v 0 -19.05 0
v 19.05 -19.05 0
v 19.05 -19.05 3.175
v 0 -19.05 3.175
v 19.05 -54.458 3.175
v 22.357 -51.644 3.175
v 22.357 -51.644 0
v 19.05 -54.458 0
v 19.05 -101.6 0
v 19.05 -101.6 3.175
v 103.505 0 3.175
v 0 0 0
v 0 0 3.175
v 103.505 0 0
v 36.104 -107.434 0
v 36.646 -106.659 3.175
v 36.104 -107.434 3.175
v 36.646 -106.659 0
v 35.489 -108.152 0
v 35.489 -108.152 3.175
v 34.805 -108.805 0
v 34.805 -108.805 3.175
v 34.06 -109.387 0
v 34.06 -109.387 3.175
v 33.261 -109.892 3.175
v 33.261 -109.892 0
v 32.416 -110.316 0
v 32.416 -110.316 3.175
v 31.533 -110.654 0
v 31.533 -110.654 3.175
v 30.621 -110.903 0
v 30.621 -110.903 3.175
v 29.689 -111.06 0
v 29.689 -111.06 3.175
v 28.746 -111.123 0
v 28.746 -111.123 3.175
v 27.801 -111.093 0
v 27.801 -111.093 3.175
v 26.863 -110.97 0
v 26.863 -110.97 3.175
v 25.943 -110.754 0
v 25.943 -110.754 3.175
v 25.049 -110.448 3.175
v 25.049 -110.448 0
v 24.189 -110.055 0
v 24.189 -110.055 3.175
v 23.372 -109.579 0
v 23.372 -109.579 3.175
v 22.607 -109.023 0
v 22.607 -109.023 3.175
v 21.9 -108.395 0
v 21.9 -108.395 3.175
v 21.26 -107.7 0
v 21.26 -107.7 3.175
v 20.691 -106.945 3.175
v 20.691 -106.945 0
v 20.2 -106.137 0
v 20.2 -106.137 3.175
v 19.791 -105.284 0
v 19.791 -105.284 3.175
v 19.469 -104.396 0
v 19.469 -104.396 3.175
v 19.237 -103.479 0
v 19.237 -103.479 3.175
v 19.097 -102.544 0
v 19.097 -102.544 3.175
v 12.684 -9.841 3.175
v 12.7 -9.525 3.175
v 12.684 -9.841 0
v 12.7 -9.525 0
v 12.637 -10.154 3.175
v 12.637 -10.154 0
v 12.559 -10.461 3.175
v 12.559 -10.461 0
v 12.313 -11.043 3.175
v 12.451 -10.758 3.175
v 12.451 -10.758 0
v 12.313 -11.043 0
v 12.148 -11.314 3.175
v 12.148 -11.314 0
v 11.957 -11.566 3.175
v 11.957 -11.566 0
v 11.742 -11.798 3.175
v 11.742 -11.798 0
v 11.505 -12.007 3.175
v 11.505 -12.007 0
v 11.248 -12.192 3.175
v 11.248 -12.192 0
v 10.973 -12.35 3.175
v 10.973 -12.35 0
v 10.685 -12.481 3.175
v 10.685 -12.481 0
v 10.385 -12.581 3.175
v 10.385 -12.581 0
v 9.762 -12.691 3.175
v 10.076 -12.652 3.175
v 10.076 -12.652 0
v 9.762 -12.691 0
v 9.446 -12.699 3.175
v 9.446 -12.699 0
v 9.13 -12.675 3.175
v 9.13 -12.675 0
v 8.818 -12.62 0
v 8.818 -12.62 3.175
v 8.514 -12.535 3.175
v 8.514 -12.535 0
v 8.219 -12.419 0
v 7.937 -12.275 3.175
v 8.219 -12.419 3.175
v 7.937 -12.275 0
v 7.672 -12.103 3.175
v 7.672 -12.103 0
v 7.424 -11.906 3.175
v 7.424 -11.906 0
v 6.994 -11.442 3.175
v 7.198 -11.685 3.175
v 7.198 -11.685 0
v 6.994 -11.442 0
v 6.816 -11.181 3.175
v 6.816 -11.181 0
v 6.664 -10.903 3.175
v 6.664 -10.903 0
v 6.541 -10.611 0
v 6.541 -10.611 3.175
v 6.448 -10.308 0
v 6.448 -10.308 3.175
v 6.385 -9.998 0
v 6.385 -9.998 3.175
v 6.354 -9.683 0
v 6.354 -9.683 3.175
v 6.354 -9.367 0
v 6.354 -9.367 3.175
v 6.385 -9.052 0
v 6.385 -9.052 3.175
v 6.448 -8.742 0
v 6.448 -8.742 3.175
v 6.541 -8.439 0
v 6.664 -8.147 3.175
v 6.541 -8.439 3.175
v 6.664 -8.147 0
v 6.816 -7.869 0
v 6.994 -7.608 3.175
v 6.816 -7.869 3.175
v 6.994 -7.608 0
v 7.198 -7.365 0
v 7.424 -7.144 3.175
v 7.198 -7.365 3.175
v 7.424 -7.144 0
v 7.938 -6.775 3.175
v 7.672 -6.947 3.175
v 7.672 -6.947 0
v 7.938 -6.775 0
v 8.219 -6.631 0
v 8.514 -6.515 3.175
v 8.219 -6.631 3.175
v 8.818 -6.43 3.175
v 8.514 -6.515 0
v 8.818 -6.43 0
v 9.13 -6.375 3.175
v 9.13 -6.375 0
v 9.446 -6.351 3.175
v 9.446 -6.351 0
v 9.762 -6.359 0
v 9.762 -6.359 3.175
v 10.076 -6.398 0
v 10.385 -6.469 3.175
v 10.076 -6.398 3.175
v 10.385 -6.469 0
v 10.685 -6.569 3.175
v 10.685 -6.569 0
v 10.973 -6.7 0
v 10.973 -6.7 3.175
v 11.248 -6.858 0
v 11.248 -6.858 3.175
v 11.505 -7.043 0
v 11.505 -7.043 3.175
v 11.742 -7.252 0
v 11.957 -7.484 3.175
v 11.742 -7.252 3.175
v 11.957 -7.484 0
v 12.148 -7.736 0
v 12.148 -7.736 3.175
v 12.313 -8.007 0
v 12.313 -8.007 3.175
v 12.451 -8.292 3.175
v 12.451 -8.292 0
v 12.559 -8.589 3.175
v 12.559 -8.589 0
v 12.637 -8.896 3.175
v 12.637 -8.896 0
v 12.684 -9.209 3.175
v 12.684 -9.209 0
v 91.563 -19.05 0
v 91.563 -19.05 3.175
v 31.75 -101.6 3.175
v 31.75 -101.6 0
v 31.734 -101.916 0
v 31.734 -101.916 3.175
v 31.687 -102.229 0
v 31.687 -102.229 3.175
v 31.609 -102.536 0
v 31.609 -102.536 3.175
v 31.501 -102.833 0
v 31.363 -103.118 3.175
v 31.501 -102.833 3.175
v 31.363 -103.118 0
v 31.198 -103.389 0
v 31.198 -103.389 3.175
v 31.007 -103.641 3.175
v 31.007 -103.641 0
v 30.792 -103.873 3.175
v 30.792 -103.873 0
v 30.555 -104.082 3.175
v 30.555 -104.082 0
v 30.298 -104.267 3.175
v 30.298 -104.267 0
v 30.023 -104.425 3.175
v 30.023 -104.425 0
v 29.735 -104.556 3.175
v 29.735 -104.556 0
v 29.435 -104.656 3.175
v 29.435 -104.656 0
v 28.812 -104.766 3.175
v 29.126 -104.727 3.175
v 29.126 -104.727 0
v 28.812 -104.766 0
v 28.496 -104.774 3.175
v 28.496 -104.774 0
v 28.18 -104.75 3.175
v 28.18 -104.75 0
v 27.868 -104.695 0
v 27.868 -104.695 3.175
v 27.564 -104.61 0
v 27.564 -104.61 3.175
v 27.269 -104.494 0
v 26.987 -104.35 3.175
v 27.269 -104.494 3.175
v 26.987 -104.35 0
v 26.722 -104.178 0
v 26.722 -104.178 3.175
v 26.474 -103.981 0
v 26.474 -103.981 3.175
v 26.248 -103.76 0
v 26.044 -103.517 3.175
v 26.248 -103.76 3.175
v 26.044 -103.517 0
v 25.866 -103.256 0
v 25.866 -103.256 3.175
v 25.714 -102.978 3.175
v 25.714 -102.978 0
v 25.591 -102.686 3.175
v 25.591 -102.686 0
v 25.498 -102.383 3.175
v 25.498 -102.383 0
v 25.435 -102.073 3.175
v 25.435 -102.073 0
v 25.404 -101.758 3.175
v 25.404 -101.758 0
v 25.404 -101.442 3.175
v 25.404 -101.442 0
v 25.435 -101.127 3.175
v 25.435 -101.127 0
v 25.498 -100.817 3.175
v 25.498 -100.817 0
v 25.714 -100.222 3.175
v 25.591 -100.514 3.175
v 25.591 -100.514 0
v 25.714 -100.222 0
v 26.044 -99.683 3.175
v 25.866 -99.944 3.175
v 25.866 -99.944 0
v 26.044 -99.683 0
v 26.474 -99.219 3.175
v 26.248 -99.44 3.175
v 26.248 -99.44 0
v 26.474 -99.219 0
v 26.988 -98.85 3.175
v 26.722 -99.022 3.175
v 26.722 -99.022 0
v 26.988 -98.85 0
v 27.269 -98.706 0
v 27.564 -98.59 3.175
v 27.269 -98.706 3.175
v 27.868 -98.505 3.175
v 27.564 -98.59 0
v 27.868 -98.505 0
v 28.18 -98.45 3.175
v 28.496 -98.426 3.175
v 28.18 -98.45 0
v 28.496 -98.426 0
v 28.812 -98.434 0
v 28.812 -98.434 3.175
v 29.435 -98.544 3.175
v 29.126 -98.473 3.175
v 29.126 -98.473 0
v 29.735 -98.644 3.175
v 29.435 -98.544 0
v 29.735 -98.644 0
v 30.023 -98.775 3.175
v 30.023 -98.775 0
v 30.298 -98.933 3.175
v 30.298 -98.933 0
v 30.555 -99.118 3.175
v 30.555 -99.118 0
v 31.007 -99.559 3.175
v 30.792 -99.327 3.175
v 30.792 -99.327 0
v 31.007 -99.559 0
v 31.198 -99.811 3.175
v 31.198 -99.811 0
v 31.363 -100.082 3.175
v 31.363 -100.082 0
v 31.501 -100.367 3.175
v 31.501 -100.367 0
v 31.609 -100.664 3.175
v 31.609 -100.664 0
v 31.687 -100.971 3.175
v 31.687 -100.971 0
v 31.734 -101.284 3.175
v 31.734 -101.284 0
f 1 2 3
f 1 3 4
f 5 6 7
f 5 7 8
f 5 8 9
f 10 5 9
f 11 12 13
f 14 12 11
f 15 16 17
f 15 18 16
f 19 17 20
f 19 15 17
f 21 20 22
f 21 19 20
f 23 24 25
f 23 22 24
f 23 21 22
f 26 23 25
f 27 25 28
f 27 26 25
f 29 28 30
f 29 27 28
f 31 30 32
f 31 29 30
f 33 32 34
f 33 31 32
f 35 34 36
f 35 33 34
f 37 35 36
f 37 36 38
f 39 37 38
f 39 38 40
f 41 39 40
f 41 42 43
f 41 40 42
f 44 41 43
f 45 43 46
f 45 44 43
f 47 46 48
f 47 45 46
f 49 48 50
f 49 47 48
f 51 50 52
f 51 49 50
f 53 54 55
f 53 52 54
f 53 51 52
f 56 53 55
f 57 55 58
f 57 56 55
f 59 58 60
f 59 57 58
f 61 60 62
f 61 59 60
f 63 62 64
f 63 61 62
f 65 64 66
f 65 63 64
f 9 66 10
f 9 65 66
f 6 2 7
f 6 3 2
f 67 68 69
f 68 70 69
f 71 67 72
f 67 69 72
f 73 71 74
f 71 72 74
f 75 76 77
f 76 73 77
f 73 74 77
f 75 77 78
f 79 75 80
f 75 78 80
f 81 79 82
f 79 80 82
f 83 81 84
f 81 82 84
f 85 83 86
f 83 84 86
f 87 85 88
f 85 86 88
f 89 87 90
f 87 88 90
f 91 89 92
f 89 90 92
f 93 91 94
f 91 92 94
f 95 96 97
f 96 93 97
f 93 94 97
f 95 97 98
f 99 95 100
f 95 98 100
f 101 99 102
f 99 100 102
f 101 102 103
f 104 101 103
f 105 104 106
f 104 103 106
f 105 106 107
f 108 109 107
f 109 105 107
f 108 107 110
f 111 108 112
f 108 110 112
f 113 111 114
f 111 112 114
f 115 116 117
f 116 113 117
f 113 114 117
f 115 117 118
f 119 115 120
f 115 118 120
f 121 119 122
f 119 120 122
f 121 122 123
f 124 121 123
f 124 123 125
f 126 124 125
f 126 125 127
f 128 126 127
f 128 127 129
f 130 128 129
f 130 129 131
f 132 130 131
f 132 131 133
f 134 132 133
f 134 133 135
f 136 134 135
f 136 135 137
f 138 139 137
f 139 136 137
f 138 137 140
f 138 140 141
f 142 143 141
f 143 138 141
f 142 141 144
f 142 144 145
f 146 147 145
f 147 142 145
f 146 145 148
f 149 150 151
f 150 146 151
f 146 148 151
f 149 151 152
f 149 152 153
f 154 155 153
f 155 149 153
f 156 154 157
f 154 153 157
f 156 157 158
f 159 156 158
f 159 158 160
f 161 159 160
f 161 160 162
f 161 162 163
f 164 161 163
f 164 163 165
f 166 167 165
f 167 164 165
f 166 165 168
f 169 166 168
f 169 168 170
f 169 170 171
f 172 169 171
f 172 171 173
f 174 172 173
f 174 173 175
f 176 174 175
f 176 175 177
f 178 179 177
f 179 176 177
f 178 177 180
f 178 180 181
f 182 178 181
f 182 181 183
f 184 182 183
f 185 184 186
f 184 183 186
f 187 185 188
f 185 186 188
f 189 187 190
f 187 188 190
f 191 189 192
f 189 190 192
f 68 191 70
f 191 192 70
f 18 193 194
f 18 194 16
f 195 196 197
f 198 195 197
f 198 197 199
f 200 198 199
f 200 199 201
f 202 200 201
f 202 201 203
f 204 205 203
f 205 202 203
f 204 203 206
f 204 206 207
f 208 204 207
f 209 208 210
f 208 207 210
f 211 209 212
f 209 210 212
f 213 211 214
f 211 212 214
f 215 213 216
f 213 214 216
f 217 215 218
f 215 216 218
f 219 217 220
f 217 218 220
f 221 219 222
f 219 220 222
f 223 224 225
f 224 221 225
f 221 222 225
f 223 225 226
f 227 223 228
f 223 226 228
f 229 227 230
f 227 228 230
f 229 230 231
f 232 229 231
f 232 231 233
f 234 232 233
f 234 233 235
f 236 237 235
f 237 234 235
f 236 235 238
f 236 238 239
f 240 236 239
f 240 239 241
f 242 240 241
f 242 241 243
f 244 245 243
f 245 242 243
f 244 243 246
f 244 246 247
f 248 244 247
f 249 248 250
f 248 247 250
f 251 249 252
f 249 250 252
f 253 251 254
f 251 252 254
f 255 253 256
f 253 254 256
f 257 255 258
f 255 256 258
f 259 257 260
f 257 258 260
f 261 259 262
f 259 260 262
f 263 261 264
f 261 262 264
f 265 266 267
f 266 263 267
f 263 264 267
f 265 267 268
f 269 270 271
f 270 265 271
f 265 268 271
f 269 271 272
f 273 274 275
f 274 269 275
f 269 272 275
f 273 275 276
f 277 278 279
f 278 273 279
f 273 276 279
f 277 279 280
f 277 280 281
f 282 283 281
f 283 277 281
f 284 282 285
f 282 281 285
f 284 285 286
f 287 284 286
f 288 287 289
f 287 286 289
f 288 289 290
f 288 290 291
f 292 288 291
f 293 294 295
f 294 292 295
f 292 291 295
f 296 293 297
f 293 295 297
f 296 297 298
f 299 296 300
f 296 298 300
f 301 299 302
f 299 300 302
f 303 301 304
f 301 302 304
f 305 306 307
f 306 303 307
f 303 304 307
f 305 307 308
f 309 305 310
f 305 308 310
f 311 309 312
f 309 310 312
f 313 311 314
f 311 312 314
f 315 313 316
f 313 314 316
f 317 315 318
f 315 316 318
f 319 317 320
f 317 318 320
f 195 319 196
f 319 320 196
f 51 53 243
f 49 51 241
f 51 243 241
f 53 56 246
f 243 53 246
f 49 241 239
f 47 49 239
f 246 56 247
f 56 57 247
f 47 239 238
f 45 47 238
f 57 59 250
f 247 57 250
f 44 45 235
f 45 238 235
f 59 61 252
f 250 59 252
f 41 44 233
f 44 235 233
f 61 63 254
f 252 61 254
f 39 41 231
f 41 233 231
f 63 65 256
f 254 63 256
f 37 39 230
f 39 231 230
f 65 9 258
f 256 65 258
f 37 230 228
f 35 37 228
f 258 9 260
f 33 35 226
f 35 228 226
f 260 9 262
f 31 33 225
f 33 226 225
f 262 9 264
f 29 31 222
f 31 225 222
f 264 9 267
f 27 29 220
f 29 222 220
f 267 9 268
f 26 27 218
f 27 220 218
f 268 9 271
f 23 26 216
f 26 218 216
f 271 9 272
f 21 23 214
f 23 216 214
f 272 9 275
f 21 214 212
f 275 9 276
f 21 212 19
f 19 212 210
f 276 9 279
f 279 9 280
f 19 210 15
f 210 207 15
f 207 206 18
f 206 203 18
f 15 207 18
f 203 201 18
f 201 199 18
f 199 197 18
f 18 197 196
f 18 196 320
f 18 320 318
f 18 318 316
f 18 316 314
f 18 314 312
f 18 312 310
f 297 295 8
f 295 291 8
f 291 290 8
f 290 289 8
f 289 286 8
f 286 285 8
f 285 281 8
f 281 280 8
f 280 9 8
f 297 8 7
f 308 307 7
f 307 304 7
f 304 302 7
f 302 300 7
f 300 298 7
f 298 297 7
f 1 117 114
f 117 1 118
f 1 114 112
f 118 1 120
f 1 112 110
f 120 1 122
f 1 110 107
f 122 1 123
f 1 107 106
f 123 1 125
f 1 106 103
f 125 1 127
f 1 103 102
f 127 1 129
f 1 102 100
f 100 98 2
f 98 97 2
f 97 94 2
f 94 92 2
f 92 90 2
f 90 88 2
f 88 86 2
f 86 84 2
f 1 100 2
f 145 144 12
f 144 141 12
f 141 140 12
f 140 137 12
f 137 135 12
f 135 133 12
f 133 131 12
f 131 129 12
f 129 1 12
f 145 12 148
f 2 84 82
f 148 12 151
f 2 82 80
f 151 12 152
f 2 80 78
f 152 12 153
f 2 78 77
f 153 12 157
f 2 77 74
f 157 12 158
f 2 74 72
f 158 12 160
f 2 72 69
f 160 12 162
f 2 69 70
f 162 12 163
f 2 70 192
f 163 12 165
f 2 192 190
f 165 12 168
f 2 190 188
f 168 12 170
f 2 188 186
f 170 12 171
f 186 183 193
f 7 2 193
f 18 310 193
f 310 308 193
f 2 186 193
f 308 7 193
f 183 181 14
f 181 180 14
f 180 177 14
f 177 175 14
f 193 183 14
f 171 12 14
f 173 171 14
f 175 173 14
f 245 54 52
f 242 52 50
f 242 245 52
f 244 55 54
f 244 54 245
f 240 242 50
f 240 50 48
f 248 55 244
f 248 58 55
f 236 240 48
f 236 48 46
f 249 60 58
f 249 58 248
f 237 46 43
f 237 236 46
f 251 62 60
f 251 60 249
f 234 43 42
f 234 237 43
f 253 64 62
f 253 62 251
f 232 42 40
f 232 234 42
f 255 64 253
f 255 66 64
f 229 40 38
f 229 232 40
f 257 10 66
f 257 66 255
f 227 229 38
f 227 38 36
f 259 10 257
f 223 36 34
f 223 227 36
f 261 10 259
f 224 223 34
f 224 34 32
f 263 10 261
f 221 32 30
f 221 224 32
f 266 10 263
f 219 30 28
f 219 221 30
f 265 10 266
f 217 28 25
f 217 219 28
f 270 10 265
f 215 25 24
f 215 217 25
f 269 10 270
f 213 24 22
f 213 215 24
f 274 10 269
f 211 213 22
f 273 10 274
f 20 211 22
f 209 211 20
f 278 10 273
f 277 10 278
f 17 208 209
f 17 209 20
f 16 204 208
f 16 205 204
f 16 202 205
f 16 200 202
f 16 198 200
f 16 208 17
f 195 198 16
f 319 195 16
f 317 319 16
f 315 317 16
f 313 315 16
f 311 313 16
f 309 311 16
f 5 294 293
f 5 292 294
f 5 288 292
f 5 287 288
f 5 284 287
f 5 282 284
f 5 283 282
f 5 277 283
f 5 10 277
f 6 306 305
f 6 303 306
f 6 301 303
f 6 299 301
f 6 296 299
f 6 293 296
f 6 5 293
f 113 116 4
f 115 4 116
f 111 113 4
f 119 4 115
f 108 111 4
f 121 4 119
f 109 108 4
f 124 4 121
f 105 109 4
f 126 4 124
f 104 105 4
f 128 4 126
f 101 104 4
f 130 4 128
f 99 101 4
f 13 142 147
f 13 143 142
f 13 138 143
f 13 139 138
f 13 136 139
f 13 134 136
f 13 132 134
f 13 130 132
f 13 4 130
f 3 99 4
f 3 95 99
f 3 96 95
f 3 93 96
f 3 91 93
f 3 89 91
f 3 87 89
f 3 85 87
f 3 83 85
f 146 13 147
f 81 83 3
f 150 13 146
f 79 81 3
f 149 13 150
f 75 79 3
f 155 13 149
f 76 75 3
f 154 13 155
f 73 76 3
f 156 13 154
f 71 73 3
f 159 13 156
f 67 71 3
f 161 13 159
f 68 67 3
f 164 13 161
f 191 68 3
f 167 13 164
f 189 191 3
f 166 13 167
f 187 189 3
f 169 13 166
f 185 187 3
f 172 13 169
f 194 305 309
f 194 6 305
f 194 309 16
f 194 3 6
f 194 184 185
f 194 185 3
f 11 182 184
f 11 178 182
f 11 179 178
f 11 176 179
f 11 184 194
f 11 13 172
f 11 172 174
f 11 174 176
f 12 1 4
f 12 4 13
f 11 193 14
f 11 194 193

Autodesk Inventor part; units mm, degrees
ref_plane "YZ Plane" through (0, 0, 0) normal (1, 0, 0) x (0, 1, 0)
ref_plane "XZ Plane" through (0, 0, 0) normal (0, 1, 0) x (-1, 0, 0)
ref_plane "XY Plane" through (0, 0, 0) normal (0, 0, 1) x (1, 0, 0)
sketch "Sketch1" plane through (0, 0, 0) normal (0, 0, 1) x (1, 0, 0)
  line L0 (0, 0) -> (103.505, 0)
  line L1 (103.505, 0) -> (103.505, -19.05)
  line L2 (103.505, -19.05) -> (0, -19.05)
  line L3 (0, -19.05) -> (0, 0)
  line L4 (19.05, 0) -> (19.05, -101.6)
  circle A0 centre (28.575, -101.6) radius 9.525
  line L5 (103.505, 0) -> (36.6455, -106.659)
  circle A1 centre (28.575, -101.6) radius 3.175
  circle A2 centre (9.525, -9.525) radius 3.175
  dimension "d0" = 103.505
  dimension "d1" = 19.05
  dimension "d2" = 101.6
  dimension "d3" = 6.35
  dimension "d4" = 6.35
extrude "Extrusion1" add sketch "Sketch1" along normal blind 3.175
sketch "Sketch2" plane through (0, 0, 3.175) normal (0, 0, 1) x (1, 0, 0)
  line L0 (91.5634, -19.05) -> (103.505, 0)
  line L1 (103.505, 0) -> (141.6118, -29.0679)
  line L2 (141.6118, -29.0679) -> (106.1951, -49.8481)
  line L3 (106.1951, -49.8481) -> (91.5634, -19.05)
  point P0 (0, 0)
extrude "Extrusion2" cut sketch "Sketch2" against normal blind 6.35
sketch "Sketch3" plane through (0, 0, 3.175) normal (0, 0, 1) x (1, 0, 0)
  line L0 (19.05, -19.05) -> (22.3566, -51.6435)
  line L1 (22.3566, -51.6435) -> (19.05, -54.458)
  line L2 (19.05, -54.458) -> (19.05, -19.05)
  line L3 (0, -19.05) -> (19.05, -19.05) projected
  point P0 (0, 0)
extrude "Extrusion3" cut sketch "Sketch3" against normal blind 3.175
properties part number "Elevator Latch"
